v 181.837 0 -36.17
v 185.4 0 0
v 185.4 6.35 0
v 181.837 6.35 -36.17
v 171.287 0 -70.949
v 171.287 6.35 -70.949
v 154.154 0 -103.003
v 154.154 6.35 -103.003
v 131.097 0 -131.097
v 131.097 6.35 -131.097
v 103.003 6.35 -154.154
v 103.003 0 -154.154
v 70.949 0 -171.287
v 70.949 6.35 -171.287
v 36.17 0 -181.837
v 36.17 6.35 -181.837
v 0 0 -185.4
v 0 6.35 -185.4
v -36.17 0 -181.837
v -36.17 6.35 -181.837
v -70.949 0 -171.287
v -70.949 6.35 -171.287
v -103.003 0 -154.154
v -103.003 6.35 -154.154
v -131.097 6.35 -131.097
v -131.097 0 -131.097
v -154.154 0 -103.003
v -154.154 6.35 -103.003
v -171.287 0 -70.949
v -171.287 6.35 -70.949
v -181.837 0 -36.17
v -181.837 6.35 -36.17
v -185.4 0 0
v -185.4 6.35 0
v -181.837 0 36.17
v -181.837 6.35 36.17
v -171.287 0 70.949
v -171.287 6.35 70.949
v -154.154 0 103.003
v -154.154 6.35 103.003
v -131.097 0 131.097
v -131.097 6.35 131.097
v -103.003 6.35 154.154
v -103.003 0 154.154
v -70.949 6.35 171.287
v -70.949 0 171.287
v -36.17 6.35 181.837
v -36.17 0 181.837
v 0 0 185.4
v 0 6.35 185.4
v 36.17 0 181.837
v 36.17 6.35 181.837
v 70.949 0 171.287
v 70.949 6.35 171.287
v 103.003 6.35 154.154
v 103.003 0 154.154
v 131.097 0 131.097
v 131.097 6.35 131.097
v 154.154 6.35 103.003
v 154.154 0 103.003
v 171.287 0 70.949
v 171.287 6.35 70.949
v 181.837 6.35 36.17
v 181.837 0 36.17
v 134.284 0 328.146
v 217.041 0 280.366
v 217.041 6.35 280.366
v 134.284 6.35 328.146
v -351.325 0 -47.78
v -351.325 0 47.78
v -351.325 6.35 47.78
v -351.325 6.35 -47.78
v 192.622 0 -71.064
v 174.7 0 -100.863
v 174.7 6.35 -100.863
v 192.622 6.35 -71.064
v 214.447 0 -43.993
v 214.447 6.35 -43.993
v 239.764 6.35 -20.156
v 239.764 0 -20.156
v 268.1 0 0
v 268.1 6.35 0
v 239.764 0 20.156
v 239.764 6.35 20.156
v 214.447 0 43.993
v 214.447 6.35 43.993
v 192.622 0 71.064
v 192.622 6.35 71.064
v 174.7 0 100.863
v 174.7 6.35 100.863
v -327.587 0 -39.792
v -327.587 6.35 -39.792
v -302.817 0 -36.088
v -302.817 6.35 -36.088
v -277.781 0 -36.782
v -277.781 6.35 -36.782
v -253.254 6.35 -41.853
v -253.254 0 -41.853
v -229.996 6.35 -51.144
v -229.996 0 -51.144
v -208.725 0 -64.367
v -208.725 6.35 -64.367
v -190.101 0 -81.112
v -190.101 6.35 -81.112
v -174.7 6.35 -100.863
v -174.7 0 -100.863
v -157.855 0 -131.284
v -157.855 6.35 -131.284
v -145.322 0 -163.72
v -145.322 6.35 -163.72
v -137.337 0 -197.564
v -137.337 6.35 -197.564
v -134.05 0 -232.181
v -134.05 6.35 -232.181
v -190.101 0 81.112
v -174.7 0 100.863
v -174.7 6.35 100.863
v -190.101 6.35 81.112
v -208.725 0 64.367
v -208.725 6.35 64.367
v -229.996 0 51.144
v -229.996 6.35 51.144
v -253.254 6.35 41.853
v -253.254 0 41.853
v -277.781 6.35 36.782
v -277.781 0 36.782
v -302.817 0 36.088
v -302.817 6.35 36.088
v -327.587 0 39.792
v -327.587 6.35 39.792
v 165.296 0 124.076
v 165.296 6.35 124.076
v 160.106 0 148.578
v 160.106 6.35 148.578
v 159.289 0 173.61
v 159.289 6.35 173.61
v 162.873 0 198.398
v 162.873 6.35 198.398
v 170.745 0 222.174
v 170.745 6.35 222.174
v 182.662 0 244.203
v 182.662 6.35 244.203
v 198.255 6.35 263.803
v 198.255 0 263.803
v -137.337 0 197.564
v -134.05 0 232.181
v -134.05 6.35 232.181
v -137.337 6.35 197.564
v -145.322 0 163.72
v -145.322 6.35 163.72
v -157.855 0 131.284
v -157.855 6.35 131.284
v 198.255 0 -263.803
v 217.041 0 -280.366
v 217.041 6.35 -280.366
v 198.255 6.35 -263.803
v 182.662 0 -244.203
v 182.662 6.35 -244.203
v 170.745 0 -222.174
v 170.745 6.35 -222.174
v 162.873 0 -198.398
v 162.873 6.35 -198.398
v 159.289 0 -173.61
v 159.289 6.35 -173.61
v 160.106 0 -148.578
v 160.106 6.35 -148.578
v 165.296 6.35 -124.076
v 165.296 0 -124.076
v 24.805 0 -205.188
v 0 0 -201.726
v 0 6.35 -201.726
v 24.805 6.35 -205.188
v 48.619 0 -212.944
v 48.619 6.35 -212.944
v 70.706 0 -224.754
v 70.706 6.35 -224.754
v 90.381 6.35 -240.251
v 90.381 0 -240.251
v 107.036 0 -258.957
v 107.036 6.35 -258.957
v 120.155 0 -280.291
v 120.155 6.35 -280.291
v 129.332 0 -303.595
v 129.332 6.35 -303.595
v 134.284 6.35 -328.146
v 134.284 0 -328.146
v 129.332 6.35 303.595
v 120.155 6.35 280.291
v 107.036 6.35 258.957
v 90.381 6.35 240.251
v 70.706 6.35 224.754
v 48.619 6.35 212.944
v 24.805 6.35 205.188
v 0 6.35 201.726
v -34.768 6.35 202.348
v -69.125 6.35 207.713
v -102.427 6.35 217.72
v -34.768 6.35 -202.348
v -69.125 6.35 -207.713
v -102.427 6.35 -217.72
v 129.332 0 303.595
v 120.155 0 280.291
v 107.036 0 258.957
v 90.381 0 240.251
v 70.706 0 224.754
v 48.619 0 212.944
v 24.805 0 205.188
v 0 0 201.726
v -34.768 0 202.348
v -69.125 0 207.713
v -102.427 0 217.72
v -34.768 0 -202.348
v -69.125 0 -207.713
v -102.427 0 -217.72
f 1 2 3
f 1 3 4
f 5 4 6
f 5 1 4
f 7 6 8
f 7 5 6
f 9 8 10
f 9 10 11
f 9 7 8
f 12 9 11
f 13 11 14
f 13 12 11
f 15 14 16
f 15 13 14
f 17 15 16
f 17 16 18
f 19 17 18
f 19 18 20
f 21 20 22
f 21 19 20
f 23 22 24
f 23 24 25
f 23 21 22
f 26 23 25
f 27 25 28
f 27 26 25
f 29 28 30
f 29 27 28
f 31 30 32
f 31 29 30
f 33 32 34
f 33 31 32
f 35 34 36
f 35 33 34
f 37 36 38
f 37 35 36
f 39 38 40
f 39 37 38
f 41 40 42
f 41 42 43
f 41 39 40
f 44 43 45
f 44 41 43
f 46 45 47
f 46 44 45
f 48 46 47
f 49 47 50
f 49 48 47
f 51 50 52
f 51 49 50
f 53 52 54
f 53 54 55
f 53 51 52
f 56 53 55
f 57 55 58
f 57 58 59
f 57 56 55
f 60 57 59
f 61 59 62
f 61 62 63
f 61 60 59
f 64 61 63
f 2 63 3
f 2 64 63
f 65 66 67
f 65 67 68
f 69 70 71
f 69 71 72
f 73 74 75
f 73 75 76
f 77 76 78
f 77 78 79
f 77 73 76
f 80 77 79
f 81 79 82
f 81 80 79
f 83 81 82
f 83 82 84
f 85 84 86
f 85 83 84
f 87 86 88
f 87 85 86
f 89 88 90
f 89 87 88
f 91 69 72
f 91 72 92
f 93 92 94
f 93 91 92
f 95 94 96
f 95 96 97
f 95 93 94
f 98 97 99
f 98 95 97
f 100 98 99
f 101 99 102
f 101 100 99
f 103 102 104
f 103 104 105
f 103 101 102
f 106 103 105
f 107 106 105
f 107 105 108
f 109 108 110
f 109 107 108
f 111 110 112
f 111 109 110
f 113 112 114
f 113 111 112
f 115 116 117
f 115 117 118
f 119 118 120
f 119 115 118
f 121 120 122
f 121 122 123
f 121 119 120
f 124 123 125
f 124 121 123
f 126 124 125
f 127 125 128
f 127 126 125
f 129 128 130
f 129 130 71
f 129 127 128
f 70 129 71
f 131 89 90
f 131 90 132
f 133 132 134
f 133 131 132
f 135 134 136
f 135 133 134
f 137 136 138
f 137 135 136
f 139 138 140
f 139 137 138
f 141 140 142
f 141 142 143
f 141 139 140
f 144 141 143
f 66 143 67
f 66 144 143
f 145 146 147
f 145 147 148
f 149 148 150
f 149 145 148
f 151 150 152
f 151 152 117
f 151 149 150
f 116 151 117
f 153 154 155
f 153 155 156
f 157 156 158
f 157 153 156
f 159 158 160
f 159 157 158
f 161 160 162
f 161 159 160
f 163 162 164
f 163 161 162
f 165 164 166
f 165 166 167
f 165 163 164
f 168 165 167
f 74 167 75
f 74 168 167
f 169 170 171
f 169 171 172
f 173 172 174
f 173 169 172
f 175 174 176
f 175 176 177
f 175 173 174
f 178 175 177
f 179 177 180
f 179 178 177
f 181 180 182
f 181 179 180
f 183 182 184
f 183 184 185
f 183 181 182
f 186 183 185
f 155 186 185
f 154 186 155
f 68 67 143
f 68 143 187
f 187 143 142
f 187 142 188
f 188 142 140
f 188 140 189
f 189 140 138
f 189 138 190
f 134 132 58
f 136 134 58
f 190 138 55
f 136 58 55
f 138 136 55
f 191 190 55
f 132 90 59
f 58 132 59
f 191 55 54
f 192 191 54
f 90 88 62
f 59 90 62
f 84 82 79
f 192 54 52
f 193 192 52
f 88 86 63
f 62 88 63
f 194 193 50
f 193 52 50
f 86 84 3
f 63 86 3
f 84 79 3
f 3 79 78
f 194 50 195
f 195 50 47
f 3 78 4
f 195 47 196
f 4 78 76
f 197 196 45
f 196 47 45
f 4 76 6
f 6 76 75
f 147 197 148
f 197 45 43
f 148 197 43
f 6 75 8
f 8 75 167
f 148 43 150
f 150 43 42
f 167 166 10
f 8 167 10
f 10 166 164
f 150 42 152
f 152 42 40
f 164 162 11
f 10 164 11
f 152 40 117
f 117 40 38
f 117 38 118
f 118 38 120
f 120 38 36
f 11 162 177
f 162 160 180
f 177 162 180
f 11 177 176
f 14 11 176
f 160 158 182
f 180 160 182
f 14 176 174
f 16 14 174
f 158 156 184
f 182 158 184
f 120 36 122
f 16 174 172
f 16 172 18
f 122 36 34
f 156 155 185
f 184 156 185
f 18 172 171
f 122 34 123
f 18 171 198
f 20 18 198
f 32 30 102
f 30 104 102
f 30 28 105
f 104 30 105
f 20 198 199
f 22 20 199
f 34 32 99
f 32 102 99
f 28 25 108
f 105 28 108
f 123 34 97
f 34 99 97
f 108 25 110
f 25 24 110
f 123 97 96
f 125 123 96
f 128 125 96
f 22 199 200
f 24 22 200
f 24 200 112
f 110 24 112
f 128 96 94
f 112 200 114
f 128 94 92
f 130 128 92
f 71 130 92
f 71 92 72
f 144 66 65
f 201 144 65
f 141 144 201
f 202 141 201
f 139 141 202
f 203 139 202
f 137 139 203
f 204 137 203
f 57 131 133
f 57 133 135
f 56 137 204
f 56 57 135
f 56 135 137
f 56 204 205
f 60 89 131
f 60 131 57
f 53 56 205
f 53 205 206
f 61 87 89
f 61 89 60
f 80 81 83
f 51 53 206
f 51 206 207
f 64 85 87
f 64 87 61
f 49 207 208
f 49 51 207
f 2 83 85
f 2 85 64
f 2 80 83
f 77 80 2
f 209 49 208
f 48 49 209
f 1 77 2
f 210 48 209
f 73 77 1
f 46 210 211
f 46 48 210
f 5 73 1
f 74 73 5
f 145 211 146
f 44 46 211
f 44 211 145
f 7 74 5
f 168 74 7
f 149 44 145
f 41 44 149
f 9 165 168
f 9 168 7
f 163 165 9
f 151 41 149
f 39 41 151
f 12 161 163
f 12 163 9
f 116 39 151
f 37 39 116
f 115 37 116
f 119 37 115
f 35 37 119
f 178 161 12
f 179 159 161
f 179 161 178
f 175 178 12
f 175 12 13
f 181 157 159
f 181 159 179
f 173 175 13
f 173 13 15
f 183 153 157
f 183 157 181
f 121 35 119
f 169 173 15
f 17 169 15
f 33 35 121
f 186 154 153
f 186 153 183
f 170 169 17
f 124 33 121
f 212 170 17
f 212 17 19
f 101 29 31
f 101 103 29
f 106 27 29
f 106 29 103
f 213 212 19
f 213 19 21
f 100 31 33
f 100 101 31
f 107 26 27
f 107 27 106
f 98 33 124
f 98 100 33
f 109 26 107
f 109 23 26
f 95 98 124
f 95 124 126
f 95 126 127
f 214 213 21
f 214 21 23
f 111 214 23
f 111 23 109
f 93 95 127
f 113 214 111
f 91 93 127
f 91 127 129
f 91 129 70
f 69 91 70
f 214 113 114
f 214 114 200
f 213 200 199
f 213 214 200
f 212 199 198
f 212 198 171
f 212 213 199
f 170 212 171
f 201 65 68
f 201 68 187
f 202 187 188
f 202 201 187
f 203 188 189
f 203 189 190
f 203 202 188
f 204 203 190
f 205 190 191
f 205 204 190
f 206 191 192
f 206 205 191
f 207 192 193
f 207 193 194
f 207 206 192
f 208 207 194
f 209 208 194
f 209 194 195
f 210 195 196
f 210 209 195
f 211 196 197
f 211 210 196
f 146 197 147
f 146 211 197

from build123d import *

# Parameters (mm, degrees)
SKETCH1_R           = 185.399607796
BOSS_EXTRUDE1_DEPTH = 6.35


with BuildPart() as part:
    # Sketch1 → Boss-Extrude1 (new body)
    with BuildSketch(Plane(origin=(0, 0, 0), x_dir=(1, 0, 0), z_dir=(0, 1, 0))):
        with BuildLine():
            Line((-351.324940876, -47.780214023), (-351.324940876, 47.780214023))
            ThreePointArc((-351.324940876, 47.780214023), (-253.254269273, 41.853018609), (-174.699704526, 100.862921435))
            ThreePointArc((-174.699704526, 100.862921435), (-145.322196596, 163.719911973), (-134.05, 232.181410755))
            ThreePointArc((-134.05, 232.181410755), (-69.124504576, 207.712669972), (0, 201.72584287))
            ThreePointArc((0, 201.72584287), (90.381357296, 240.251140111), (134.283591296, 328.146430793))
            Line((134.283591296, 328.146430793), (217.04134958, 280.366216771))
            ThreePointArc((217.04134958, 280.366216771), (162.872911977, 198.398121503), (174.699704526, 100.862921435))
            ThreePointArc((174.699704526, 100.862921435), (214.446701172, 43.992758), (268.1, 0))
            ThreePointArc((268.1, 0), (214.446701172, -43.992758), (174.699704526, -100.862921435))
            ThreePointArc((174.699704526, -100.862921435), (162.872911977, -198.398121503), (217.04134958, -280.366216771))
            Line((217.04134958, -280.366216771), (134.283591296, -328.146430793))
            ThreePointArc((134.283591296, -328.146430793), (90.381357296, -240.251140111), (0, -201.72584287))
            ThreePointArc((0, -201.72584287), (-69.124504576, -207.712669972), (-134.05, -232.181410755))
            ThreePointArc((-134.05, -232.181410755), (-145.322196596, -163.719911973), (-174.699704526, -100.862921435))
            ThreePointArc((-174.699704526, -100.862921435), (-253.254269273, -41.853018609), (-351.324940876, -47.780214023))
        make_face()
        Circle(SKETCH1_R, mode=Mode.SUBTRACT)
    extrude(amount=BOSS_EXTRUDE1_DEPTH)


solid = part.part
